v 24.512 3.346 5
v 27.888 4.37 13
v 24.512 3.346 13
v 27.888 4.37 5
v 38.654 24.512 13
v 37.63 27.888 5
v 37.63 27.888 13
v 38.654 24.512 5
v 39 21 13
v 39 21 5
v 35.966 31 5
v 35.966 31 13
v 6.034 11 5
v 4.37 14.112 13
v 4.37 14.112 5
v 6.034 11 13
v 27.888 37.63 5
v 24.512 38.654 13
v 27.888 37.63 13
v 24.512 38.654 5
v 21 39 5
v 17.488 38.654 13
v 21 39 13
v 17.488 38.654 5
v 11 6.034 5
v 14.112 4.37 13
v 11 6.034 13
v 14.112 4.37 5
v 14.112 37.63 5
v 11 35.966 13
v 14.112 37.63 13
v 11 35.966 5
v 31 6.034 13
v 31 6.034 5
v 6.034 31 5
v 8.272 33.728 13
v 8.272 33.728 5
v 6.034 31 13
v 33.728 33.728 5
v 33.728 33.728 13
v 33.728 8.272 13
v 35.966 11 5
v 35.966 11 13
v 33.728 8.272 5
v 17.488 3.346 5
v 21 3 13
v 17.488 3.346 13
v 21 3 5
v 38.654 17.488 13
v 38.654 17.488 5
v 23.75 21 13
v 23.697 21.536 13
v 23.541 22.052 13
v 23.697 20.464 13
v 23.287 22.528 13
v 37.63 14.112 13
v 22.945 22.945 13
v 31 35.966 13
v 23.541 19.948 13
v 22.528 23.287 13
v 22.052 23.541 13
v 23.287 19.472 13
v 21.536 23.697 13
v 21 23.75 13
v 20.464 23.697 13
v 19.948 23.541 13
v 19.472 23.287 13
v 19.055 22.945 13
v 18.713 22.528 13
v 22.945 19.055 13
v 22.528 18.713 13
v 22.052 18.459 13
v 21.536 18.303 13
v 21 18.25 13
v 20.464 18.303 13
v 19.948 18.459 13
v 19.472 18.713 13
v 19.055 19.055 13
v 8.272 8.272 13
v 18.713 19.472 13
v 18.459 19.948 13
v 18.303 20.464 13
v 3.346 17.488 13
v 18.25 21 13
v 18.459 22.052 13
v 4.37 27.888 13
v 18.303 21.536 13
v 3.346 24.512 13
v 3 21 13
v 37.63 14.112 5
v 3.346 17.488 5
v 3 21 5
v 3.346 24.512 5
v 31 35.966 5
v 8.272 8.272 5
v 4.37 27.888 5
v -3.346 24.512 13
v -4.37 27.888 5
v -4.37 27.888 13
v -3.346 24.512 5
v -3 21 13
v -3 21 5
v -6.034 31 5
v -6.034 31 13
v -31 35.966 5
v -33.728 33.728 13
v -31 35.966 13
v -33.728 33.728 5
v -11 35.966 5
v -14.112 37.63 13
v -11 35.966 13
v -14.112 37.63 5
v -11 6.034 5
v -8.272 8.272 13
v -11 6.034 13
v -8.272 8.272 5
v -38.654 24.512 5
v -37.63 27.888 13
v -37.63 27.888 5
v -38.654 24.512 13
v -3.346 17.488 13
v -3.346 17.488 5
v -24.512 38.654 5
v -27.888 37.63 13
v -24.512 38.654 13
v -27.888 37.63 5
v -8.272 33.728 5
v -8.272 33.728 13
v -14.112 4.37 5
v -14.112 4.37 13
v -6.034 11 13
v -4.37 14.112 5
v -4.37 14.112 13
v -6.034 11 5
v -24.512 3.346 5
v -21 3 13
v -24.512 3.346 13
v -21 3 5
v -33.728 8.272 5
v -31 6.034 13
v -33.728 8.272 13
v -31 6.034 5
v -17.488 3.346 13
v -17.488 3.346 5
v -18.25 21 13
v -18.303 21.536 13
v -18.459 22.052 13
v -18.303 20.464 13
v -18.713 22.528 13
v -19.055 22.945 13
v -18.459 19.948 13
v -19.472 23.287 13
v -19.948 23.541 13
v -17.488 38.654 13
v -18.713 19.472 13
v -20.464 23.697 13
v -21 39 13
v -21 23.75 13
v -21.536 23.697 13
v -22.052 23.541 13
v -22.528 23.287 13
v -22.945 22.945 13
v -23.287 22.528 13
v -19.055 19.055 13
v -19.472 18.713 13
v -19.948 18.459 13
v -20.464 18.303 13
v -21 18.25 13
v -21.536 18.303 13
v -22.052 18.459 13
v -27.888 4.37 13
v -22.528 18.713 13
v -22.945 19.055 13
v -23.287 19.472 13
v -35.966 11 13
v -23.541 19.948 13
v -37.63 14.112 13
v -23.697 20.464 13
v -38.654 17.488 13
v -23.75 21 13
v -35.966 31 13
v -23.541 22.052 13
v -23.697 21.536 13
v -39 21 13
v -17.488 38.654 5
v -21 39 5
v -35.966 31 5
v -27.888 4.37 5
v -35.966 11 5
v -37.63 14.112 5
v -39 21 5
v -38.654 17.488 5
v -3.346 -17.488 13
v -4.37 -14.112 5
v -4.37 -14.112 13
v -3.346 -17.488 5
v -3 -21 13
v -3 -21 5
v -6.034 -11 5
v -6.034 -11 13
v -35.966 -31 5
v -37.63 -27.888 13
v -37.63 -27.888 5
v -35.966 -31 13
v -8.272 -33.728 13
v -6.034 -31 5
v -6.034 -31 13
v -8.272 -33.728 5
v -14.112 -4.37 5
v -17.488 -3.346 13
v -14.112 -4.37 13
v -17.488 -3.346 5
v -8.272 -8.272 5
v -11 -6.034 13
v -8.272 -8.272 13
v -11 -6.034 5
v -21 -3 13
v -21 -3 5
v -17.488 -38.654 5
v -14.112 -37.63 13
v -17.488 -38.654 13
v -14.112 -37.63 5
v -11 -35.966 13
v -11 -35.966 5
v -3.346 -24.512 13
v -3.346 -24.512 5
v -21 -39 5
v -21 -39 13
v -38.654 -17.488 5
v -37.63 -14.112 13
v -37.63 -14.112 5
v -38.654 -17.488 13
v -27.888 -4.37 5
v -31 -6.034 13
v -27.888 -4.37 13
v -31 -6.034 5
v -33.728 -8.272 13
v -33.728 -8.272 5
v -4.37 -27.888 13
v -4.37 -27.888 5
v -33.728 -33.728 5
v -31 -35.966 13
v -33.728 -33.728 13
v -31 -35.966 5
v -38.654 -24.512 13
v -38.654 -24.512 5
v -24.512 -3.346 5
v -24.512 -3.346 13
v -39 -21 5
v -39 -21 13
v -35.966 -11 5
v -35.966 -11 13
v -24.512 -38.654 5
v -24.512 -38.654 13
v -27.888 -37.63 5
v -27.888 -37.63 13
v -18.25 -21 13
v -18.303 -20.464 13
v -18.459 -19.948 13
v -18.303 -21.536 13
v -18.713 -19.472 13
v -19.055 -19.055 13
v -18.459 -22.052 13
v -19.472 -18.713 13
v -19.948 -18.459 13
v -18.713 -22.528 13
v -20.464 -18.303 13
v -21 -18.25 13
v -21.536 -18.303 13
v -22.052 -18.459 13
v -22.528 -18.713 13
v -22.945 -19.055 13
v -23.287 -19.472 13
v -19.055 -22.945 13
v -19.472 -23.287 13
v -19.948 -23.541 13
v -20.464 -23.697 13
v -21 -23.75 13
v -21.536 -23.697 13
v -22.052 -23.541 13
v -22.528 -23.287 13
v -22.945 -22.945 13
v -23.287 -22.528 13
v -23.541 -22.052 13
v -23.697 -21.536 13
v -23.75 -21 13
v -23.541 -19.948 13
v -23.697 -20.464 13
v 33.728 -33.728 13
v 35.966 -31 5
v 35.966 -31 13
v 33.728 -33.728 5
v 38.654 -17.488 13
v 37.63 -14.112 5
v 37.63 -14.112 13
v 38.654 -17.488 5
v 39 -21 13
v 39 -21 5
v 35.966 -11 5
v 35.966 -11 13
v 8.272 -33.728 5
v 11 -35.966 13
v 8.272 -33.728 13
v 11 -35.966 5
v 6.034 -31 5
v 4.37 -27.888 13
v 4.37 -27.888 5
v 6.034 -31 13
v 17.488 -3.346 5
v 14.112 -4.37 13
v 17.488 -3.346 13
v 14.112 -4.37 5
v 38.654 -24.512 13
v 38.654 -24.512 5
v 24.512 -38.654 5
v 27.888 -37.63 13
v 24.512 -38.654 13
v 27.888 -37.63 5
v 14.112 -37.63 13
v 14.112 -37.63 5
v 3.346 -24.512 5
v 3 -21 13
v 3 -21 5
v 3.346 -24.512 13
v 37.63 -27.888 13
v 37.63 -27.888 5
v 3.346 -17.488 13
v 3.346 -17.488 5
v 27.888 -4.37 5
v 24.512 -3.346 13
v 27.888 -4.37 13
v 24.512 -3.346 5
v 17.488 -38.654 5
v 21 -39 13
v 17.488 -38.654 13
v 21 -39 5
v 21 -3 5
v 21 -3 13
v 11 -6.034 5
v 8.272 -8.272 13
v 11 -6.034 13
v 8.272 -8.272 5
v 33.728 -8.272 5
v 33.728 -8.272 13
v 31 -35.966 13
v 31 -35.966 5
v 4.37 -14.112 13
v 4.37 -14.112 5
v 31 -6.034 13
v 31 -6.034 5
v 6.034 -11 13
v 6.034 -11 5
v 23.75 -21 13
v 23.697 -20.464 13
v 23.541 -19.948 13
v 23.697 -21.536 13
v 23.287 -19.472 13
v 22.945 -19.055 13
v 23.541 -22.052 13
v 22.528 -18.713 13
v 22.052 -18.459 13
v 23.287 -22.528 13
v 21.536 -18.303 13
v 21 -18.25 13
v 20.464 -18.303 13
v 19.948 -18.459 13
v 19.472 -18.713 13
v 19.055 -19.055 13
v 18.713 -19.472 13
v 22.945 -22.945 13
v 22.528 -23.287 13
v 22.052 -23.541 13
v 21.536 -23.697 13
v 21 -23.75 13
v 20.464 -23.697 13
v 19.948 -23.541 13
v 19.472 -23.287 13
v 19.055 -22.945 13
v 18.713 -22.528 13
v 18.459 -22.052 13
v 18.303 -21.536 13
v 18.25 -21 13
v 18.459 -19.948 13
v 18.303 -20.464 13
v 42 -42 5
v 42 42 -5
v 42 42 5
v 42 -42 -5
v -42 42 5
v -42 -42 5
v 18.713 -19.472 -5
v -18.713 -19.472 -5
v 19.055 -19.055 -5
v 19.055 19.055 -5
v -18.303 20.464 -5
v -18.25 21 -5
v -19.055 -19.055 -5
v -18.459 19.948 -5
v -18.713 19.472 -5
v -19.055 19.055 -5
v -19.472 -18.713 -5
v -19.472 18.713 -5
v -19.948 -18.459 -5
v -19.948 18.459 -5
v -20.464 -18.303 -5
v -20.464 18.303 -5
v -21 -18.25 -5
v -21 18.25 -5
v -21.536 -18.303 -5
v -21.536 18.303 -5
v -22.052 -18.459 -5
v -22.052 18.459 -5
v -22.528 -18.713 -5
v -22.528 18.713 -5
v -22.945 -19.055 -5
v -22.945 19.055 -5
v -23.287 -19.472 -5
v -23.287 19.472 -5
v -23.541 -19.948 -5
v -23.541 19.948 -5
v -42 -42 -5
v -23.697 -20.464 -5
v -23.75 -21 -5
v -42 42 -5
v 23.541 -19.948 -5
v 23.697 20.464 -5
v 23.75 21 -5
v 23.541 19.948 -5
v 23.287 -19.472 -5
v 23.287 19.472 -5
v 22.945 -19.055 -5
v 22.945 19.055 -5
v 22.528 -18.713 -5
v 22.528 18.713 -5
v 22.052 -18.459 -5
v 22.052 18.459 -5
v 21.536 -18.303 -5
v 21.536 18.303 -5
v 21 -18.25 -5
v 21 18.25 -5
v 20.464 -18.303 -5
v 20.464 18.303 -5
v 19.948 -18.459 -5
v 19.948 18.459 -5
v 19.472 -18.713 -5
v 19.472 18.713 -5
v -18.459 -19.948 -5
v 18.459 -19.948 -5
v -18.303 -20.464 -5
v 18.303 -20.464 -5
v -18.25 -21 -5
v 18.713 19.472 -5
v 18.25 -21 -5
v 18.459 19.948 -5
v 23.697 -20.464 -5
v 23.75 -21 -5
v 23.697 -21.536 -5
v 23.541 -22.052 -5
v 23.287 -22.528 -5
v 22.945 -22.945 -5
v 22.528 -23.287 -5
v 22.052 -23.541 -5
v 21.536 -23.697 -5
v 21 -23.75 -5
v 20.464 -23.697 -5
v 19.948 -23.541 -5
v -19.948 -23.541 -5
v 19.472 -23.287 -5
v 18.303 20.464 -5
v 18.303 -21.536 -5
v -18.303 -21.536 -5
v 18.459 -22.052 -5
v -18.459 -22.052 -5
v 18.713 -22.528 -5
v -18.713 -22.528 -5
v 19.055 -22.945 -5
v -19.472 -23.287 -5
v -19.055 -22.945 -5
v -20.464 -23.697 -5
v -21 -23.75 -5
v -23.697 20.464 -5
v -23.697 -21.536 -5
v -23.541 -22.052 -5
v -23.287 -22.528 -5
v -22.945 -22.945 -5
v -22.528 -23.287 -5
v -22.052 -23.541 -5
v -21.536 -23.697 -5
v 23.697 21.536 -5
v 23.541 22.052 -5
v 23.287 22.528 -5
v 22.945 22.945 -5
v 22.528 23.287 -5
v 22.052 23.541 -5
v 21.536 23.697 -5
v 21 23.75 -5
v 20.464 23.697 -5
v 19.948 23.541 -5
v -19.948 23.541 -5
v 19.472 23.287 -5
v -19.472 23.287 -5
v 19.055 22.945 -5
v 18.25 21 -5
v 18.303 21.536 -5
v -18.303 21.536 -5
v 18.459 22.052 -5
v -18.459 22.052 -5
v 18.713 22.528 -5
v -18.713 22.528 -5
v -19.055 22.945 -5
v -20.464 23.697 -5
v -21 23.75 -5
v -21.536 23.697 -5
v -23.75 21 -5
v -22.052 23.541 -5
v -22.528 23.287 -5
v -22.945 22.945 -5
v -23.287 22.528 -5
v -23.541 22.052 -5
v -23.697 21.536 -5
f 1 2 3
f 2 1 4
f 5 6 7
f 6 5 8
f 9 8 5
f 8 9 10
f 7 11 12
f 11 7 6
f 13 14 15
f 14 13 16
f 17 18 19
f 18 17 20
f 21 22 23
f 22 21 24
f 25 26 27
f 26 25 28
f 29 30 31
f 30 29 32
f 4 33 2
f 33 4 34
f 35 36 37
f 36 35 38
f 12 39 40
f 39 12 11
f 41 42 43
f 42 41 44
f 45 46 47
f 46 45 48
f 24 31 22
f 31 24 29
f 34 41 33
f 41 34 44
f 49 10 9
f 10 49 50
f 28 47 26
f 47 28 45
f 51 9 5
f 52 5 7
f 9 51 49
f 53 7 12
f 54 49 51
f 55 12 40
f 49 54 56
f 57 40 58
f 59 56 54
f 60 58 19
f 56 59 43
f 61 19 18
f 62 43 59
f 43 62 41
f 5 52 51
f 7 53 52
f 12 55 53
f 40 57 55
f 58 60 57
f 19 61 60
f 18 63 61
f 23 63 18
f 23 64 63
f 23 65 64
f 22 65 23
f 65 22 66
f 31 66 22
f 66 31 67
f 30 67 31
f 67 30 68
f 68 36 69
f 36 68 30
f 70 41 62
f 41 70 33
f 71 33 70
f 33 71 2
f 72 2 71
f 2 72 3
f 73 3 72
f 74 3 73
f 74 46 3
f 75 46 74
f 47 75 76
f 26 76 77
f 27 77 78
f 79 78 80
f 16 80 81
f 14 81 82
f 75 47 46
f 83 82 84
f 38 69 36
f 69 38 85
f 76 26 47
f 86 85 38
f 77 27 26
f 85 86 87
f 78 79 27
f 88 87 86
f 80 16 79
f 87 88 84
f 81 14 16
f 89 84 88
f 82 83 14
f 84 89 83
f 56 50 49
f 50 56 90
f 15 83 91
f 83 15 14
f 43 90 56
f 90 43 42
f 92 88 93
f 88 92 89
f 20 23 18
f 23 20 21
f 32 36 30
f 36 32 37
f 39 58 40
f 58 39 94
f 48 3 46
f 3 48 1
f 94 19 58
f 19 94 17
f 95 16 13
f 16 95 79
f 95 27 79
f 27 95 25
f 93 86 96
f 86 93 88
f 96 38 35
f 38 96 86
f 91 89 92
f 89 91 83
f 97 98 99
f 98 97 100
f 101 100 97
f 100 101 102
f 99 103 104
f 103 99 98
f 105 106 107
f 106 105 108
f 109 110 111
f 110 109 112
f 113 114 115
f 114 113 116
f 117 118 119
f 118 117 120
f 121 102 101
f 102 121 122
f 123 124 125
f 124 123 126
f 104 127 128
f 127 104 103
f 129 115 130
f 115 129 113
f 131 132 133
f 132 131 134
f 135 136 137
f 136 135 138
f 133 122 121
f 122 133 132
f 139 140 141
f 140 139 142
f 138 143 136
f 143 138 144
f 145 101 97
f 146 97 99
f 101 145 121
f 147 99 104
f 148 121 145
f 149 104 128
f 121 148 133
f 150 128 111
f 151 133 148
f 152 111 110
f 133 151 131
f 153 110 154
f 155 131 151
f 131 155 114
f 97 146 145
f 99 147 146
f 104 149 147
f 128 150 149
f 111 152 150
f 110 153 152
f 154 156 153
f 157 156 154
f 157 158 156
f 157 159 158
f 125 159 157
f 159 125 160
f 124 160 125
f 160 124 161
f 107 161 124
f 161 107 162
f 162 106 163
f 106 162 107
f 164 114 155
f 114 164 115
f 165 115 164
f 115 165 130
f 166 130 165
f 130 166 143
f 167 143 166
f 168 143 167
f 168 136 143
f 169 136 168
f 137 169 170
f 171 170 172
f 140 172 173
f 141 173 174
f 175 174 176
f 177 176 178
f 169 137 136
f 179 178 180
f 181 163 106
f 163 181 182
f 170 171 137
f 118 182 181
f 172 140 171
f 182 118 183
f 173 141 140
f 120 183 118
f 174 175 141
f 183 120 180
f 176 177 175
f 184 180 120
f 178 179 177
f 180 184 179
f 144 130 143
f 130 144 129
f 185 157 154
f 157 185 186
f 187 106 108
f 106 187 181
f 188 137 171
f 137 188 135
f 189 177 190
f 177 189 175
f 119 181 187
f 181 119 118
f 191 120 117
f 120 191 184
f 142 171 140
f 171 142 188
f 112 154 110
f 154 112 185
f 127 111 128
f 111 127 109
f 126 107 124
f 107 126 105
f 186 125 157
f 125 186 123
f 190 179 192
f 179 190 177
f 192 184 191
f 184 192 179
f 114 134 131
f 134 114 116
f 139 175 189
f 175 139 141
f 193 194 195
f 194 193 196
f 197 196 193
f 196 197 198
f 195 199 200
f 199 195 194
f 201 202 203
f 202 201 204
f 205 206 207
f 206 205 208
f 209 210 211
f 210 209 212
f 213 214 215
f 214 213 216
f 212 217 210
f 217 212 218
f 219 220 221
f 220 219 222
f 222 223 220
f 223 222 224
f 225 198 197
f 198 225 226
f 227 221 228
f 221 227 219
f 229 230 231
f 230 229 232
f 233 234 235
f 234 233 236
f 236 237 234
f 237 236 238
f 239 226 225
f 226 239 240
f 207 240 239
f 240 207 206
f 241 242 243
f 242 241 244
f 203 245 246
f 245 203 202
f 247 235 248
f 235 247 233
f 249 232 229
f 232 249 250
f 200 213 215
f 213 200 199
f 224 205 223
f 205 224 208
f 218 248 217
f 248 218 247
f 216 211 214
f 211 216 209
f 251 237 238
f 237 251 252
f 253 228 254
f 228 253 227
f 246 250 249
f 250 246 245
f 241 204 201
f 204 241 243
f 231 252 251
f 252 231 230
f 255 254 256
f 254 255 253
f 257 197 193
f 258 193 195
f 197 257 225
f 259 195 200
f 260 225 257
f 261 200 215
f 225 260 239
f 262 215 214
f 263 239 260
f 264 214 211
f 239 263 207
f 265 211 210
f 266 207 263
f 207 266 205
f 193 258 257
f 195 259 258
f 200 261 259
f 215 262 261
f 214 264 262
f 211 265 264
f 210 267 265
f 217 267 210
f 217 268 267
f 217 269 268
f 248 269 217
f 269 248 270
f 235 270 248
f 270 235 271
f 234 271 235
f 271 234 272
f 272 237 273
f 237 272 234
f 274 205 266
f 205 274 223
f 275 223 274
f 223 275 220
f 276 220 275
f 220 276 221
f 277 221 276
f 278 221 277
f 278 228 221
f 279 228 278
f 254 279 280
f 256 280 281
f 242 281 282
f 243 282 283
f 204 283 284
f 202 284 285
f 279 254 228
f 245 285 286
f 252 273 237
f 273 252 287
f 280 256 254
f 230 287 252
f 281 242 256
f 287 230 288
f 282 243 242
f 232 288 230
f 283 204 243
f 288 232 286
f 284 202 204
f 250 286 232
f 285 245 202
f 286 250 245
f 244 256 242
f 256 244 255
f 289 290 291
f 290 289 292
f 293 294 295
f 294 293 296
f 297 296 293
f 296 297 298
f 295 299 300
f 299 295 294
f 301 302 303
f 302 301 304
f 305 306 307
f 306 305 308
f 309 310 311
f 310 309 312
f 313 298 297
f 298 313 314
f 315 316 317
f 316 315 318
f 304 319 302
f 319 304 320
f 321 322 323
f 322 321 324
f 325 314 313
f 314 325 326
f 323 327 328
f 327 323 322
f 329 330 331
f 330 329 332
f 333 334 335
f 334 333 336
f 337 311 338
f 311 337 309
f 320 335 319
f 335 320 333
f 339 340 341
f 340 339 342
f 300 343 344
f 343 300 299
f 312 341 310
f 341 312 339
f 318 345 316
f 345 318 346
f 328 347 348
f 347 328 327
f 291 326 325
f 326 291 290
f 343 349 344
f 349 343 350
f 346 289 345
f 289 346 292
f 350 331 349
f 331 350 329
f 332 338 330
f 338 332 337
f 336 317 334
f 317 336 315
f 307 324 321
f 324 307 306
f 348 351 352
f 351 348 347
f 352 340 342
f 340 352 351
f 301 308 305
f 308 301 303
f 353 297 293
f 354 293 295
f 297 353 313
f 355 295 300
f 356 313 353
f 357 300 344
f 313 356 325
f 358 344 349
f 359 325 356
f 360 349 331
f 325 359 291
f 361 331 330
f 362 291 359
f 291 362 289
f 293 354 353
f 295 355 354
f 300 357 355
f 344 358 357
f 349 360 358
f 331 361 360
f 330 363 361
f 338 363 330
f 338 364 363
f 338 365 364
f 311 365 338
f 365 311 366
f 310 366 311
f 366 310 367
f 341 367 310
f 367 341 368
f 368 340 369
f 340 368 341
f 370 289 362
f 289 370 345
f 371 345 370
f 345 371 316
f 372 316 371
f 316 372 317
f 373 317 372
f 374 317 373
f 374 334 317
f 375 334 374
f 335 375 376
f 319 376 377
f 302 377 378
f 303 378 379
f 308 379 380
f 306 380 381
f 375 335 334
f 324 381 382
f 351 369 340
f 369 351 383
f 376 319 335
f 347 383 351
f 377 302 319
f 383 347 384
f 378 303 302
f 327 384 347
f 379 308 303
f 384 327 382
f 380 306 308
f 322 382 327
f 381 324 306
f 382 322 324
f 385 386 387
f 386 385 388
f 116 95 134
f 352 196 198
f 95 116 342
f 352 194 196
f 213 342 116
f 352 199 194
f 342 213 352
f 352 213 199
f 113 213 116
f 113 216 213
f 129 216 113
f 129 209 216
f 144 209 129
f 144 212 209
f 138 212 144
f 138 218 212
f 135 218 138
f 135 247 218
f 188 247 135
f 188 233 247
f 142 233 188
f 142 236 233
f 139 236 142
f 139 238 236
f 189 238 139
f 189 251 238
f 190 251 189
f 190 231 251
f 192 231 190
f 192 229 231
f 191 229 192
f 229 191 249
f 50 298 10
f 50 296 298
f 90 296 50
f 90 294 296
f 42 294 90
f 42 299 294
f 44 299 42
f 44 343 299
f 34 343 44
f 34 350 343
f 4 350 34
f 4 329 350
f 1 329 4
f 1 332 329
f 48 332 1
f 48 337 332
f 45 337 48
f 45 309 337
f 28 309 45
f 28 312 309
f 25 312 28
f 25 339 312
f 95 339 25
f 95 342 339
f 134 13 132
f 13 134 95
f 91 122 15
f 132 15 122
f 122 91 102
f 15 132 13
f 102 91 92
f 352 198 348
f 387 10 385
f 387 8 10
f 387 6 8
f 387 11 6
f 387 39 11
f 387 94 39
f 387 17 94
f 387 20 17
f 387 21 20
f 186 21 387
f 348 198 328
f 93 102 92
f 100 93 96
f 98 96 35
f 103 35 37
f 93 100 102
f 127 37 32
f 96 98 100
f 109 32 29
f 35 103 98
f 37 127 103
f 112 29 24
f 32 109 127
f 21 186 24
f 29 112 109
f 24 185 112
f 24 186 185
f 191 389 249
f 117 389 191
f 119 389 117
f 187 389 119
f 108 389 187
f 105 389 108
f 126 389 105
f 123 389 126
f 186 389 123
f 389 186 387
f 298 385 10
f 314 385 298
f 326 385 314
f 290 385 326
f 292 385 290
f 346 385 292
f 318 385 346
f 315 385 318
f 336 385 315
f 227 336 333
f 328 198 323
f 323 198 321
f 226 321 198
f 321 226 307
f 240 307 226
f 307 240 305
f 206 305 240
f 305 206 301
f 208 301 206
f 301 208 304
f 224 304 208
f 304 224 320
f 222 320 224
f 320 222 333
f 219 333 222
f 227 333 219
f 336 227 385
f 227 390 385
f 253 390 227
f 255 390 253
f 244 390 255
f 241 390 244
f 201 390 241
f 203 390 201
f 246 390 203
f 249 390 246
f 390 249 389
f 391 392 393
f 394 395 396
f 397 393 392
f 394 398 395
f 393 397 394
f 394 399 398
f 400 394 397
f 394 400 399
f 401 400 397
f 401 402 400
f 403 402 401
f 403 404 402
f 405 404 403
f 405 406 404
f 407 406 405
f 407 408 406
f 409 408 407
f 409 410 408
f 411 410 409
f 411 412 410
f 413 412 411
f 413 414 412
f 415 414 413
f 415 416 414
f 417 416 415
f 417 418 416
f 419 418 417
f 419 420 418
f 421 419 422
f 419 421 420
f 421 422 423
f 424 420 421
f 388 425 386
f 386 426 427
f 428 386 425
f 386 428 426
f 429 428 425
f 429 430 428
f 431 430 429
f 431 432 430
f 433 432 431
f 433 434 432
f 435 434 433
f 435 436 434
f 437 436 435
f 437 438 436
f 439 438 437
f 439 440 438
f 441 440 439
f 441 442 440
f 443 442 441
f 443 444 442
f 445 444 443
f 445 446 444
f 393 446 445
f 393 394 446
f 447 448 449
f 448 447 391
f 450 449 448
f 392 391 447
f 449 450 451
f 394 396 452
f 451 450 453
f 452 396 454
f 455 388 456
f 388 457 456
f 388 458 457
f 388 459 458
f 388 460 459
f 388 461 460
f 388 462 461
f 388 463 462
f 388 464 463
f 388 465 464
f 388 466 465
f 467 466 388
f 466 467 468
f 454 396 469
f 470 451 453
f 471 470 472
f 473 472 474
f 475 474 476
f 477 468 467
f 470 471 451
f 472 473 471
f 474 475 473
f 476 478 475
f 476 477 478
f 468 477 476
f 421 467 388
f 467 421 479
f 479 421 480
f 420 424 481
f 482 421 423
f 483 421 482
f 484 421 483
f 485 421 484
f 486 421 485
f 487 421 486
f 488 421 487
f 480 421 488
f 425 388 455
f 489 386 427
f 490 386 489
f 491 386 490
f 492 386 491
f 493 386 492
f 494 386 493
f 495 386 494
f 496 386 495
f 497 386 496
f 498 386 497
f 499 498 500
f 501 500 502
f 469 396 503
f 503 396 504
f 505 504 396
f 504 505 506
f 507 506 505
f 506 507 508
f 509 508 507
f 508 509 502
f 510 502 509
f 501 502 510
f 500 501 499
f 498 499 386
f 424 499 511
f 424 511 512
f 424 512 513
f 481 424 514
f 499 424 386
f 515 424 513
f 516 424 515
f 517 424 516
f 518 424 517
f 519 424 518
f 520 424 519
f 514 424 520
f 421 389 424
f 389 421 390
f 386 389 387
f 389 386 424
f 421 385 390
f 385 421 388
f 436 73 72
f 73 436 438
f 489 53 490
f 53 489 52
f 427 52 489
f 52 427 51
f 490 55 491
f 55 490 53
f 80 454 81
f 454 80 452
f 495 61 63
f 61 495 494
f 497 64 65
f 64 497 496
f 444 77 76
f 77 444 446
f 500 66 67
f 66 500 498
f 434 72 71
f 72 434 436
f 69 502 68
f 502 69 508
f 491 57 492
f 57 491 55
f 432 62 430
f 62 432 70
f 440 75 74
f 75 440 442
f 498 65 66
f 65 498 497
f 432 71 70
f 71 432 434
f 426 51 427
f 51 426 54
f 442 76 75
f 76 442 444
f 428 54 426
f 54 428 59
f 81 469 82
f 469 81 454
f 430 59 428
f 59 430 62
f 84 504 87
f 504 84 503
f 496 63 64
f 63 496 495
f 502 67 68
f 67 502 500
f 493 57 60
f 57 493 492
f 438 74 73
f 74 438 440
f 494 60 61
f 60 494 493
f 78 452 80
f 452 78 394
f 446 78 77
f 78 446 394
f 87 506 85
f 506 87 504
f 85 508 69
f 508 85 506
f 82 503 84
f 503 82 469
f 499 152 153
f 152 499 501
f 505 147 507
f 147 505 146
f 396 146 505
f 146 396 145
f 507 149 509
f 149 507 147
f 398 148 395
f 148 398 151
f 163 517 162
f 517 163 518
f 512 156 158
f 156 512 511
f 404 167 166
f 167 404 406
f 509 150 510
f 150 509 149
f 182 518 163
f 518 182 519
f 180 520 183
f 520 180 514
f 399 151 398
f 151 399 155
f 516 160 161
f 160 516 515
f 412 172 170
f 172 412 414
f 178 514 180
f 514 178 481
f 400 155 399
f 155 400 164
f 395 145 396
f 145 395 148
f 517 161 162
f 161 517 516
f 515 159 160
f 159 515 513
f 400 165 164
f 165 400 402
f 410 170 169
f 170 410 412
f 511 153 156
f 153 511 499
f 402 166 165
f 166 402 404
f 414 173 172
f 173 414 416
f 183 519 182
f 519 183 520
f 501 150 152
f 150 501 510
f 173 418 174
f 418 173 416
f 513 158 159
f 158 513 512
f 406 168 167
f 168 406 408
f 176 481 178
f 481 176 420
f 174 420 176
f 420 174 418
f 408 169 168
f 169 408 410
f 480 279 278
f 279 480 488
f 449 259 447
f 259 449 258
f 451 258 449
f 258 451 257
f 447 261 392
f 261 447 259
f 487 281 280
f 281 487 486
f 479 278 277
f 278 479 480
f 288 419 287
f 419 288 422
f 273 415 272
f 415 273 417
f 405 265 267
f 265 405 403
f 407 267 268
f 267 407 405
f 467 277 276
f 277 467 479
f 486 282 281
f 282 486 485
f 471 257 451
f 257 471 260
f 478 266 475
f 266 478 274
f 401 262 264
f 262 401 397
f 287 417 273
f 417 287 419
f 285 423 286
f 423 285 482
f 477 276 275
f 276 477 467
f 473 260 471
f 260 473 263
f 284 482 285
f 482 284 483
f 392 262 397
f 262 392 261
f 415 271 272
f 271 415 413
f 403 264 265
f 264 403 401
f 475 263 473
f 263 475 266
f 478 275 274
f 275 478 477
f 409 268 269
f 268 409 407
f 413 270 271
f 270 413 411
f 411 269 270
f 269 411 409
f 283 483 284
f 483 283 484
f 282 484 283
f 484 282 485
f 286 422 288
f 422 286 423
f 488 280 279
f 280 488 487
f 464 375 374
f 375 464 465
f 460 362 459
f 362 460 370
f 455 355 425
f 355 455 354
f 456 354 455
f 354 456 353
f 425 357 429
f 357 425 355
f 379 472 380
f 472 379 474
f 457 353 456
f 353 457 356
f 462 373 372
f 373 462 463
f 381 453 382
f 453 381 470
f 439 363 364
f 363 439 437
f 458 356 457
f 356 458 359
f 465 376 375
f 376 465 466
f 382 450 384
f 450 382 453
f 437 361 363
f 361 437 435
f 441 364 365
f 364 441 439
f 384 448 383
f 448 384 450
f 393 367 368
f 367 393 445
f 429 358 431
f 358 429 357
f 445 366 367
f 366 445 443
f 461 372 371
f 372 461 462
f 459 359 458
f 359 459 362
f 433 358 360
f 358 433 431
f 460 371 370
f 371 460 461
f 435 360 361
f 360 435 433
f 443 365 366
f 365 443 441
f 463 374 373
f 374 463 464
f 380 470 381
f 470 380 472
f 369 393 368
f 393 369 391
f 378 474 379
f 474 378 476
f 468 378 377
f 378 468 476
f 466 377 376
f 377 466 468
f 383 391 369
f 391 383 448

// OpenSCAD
$fn = 32;

// ----------------------------------------------------------------------
// Anchor pads 84 x 84 x 18
// four corner bosses with anchor holes
// ----------------------------------------------------------------------

// --- parameters (mm) ---
plate = [84, 84, 10];  // base plate size (x, y, z)
pads = 4;              // boss count, one per corner
edge = 21;             // boss centre offset from the plate edge
boss_d = 36;           // boss diameter
boss_h = 8;            // boss height above the base plate
hole_d = 5.5;          // hole diameter

// --- derived feature positions (mm) ---
height = plate[2] + boss_h;      // = 18   overall height of the part
corner_x = plate[0] / 2 - edge;  // = 21   boss centre X
corner_y = plate[1] / 2 - edge;  // = 21   boss centre Y
feature_centers = [
  [corner_x, corner_y],
  [-corner_x, corner_y],
  [-corner_x, -corner_y],
  [corner_x, -corner_y]
];   // boss centres, anchor holes are drilled there

// base plate, four bosses standing on it, anchor holes all the way through
difference() {
  union() {
    cube(plate, center = true);
    for (centre = feature_centers)
      translate([centre[0], centre[1], plate[2] / 2 - 1])
        cylinder(d = boss_d, h = boss_h + 1);
  }
  for (centre = feature_centers)
    translate([centre[0], centre[1], -height])
      cylinder(d = hole_d, h = 2 * height + 2);  // through boss and plate
}
